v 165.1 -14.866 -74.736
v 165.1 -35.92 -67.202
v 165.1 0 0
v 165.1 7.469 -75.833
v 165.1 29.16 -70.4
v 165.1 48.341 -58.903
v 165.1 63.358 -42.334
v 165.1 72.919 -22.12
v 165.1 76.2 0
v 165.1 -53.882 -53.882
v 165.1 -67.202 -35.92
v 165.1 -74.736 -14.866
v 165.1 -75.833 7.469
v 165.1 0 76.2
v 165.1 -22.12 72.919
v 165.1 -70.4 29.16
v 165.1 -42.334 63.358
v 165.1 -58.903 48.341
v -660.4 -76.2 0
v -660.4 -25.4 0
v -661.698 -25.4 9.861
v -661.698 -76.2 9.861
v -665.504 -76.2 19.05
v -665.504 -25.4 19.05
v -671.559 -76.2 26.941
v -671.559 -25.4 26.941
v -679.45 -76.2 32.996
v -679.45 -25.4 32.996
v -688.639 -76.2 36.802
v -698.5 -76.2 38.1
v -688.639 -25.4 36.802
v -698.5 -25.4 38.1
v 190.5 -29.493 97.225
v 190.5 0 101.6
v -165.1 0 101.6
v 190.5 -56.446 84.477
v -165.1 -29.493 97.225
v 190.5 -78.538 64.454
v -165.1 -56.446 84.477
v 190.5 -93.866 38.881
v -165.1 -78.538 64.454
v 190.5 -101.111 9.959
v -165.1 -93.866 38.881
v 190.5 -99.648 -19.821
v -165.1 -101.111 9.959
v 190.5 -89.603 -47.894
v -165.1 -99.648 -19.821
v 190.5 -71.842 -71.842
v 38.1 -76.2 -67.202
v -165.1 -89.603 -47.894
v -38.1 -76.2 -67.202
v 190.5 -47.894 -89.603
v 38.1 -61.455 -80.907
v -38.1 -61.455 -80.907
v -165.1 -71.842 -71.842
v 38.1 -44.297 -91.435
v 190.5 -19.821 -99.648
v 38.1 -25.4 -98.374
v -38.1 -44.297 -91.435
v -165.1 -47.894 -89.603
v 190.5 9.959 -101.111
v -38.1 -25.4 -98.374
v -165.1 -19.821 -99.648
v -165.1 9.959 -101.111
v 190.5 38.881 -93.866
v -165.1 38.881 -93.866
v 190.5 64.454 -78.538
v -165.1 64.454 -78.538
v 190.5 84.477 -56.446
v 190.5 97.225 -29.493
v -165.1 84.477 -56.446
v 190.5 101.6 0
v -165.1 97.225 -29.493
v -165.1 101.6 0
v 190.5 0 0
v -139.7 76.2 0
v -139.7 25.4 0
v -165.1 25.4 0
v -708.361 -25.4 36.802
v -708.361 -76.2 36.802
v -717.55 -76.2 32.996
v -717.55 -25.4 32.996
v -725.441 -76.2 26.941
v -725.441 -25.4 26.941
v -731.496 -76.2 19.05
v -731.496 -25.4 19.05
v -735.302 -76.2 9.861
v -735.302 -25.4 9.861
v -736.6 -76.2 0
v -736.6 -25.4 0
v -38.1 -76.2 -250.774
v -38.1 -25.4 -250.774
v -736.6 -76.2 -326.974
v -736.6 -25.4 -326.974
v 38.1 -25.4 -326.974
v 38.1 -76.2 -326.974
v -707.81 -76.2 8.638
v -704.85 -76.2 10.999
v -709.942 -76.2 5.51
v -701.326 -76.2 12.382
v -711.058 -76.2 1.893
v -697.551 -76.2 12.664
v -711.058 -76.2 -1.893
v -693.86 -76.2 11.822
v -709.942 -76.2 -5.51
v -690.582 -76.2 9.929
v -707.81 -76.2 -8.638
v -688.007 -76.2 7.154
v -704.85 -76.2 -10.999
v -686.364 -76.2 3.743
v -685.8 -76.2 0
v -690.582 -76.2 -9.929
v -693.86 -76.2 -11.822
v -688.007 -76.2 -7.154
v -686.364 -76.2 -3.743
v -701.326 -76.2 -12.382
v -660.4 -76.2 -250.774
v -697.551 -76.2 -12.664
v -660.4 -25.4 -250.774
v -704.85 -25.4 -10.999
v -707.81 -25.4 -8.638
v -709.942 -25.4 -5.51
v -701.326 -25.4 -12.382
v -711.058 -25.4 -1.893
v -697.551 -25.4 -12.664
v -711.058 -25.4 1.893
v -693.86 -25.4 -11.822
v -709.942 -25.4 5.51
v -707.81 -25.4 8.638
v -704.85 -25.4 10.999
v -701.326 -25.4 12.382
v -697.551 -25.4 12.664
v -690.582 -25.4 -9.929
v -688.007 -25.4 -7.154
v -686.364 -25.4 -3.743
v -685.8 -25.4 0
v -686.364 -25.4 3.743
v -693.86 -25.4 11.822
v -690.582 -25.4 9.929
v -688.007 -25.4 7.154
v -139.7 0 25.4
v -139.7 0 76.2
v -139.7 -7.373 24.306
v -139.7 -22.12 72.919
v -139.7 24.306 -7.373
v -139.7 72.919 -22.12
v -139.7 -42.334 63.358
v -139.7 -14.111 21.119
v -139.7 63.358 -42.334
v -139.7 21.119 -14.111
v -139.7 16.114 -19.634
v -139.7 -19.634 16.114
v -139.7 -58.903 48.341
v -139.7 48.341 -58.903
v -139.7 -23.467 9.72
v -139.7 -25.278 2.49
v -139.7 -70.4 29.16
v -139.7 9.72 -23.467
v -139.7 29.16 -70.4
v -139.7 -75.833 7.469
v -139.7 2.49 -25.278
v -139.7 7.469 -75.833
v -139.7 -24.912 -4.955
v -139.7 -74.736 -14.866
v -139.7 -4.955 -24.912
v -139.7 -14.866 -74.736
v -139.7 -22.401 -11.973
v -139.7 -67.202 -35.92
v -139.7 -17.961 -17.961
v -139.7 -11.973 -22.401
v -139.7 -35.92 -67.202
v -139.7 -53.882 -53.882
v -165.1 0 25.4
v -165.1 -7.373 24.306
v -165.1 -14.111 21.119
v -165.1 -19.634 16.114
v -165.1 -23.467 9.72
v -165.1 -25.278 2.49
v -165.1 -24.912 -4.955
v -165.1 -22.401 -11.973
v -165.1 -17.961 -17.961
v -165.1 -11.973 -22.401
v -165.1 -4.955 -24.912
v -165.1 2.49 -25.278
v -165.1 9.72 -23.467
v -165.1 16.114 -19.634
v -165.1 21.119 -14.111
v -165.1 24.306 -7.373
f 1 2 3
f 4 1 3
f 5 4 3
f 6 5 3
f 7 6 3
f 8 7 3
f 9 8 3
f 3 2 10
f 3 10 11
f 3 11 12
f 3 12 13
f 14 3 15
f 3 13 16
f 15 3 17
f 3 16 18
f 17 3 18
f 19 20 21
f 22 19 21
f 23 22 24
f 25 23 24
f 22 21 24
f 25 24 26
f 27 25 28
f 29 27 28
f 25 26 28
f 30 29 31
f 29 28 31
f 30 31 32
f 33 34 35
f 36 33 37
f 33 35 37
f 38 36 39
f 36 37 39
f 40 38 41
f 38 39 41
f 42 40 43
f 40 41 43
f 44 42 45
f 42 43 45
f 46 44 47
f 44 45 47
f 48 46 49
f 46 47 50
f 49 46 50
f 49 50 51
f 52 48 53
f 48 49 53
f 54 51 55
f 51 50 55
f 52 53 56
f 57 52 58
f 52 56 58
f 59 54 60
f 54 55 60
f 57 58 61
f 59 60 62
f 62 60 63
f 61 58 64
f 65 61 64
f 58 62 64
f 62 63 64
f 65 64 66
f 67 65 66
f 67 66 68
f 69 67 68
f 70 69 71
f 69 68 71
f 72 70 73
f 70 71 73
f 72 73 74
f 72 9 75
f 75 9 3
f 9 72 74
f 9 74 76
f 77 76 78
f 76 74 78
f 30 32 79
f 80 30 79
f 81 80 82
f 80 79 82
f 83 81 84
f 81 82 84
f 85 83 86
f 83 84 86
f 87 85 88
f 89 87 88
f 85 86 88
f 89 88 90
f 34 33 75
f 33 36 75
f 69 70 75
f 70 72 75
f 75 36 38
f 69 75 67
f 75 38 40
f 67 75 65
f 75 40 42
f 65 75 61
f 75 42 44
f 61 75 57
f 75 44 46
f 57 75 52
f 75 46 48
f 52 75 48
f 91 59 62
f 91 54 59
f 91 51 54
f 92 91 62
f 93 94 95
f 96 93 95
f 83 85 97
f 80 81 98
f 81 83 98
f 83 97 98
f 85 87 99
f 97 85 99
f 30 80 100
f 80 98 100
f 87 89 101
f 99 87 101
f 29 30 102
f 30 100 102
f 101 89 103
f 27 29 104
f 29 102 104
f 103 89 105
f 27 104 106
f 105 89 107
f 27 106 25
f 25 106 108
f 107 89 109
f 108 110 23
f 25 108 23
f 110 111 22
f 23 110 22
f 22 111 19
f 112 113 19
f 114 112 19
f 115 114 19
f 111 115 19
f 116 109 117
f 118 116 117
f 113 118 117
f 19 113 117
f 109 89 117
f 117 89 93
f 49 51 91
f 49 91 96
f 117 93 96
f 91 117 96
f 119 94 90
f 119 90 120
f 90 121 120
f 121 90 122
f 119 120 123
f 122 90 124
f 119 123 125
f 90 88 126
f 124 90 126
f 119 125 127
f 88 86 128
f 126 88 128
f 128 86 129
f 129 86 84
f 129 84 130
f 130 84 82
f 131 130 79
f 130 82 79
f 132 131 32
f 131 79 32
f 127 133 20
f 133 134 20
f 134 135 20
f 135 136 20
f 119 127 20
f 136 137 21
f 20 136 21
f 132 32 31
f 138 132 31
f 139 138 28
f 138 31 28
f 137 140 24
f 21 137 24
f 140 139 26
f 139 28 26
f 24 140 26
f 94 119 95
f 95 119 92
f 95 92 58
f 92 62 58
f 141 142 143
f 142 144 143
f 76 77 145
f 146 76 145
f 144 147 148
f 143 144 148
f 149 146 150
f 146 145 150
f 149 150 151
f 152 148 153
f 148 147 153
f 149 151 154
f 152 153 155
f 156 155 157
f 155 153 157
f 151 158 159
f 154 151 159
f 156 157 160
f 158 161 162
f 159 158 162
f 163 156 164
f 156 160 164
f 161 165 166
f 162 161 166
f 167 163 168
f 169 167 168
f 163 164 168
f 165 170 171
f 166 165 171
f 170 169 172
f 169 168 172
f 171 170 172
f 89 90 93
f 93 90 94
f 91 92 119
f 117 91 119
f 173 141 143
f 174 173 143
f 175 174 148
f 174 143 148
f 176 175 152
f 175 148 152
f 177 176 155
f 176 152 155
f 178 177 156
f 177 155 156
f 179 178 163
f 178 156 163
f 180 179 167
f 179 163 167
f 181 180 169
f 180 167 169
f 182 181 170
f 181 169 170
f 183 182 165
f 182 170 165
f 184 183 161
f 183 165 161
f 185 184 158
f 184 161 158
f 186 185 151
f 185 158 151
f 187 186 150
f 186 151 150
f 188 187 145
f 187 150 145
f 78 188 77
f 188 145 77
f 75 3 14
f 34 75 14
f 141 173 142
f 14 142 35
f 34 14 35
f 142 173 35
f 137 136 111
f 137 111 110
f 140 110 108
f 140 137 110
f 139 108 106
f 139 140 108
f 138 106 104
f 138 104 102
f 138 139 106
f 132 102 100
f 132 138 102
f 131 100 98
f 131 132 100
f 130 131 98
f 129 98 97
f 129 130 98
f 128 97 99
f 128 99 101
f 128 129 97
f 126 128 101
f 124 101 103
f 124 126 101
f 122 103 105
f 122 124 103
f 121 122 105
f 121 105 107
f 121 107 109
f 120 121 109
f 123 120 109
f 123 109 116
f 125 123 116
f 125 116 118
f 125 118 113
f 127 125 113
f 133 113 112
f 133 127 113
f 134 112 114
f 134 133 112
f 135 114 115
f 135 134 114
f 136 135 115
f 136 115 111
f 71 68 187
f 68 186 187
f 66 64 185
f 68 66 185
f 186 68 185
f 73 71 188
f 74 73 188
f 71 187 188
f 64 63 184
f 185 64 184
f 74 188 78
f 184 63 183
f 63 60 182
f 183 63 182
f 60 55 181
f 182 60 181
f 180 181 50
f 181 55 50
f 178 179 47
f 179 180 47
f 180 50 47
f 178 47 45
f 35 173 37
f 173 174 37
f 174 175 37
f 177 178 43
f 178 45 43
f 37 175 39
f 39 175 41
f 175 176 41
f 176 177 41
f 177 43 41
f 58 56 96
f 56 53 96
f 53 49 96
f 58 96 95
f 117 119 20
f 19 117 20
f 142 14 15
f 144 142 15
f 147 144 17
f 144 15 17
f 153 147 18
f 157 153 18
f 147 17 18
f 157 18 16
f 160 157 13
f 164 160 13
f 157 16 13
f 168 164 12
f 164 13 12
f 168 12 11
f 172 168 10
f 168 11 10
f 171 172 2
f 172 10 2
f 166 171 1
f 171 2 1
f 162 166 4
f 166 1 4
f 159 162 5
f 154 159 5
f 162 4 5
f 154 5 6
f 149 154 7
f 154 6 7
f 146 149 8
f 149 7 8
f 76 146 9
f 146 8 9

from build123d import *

# Parameters (mm, degrees)
F3_R      = 12.7
F4_DEPTH  = 50.8
F4_FACE_W = 76.2
F4_FACE_H = 50.8
F6_W      = 218.9167588949
F6_H      = 225.1323610544
F7_DEPTH  = 723.20793


with BuildPart() as f1:
    # F0 (on Front) → F1 (revolve)
    with BuildSketch(Plane.XZ):
        Polygon((165.1, 76.2), (165.1, 0), (190.5, 0), (190.5, 101.6), (-165.1, 101.6), (-165.1, 25.4), (-139.7, 25.4), (-139.7, 76.2), align=None)
    revolve(axis=Axis((0, 0, 0), (1, 0, 0)))

    # F3 (on offset) → F4 (join)
    with BuildSketch(Plane.XZ.offset(25.4)):
        with BuildLine():
            Line((38.1, -98.3737769937), (-38.1, -98.3737769937))
            Line((-38.1, -98.3737769937), (-38.1, -250.7737769937))
            Line((-38.1, -250.7737769937), (-660.4, -250.7737769937))
            Line((-660.4, -250.7737769937), (-660.4, 0))
            ThreePointArc((-660.4, 0), (-671.5592316368, 26.9407683632), (-698.5, 38.1))
            ThreePointArc((-698.5, 38.1), (-725.4407683632, 26.9407683632), (-736.6, 0))
            Line((-736.6, 0), (-736.6, -326.9737769937))
            Line((-736.6, -326.9737769937), (-660.4, -326.9737769937))
            Line((-660.4, -326.9737769937), (38.1, -326.9737769937))
            Line((38.1, -326.9737769937), (38.1, -250.7737769937))
            Line((38.1, -250.7737769937), (38.1, -98.3737769937))
        make_face()
        with Locations((-698.5, 0)):
            Circle(F3_R, mode=Mode.SUBTRACT)
    extrude(amount=F4_DEPTH)

    # F4_face (on face) → F5 (join, up to the next surface of F1)
    with BuildSketch(Plane(origin=(0, -50.8, -98.3737769937), x_dir=(1, 0, 0), z_dir=(0, 0, 1))):
        Rectangle(F4_FACE_W, F4_FACE_H)
    extrude(until=Until.NEXT)

    # F6 (on face) → F7 (cut)
    with BuildSketch(Plane(origin=(-165.1, 0, 0), x_dir=(0, -1, 0), z_dir=(-1, 0, 0))):
        with Locations((-109.4583794475, 112.5661805272)):
            Rectangle(F6_W, F6_H)
    extrude(amount=-F7_DEPTH, mode=Mode.SUBTRACT)


solid = f1.part
